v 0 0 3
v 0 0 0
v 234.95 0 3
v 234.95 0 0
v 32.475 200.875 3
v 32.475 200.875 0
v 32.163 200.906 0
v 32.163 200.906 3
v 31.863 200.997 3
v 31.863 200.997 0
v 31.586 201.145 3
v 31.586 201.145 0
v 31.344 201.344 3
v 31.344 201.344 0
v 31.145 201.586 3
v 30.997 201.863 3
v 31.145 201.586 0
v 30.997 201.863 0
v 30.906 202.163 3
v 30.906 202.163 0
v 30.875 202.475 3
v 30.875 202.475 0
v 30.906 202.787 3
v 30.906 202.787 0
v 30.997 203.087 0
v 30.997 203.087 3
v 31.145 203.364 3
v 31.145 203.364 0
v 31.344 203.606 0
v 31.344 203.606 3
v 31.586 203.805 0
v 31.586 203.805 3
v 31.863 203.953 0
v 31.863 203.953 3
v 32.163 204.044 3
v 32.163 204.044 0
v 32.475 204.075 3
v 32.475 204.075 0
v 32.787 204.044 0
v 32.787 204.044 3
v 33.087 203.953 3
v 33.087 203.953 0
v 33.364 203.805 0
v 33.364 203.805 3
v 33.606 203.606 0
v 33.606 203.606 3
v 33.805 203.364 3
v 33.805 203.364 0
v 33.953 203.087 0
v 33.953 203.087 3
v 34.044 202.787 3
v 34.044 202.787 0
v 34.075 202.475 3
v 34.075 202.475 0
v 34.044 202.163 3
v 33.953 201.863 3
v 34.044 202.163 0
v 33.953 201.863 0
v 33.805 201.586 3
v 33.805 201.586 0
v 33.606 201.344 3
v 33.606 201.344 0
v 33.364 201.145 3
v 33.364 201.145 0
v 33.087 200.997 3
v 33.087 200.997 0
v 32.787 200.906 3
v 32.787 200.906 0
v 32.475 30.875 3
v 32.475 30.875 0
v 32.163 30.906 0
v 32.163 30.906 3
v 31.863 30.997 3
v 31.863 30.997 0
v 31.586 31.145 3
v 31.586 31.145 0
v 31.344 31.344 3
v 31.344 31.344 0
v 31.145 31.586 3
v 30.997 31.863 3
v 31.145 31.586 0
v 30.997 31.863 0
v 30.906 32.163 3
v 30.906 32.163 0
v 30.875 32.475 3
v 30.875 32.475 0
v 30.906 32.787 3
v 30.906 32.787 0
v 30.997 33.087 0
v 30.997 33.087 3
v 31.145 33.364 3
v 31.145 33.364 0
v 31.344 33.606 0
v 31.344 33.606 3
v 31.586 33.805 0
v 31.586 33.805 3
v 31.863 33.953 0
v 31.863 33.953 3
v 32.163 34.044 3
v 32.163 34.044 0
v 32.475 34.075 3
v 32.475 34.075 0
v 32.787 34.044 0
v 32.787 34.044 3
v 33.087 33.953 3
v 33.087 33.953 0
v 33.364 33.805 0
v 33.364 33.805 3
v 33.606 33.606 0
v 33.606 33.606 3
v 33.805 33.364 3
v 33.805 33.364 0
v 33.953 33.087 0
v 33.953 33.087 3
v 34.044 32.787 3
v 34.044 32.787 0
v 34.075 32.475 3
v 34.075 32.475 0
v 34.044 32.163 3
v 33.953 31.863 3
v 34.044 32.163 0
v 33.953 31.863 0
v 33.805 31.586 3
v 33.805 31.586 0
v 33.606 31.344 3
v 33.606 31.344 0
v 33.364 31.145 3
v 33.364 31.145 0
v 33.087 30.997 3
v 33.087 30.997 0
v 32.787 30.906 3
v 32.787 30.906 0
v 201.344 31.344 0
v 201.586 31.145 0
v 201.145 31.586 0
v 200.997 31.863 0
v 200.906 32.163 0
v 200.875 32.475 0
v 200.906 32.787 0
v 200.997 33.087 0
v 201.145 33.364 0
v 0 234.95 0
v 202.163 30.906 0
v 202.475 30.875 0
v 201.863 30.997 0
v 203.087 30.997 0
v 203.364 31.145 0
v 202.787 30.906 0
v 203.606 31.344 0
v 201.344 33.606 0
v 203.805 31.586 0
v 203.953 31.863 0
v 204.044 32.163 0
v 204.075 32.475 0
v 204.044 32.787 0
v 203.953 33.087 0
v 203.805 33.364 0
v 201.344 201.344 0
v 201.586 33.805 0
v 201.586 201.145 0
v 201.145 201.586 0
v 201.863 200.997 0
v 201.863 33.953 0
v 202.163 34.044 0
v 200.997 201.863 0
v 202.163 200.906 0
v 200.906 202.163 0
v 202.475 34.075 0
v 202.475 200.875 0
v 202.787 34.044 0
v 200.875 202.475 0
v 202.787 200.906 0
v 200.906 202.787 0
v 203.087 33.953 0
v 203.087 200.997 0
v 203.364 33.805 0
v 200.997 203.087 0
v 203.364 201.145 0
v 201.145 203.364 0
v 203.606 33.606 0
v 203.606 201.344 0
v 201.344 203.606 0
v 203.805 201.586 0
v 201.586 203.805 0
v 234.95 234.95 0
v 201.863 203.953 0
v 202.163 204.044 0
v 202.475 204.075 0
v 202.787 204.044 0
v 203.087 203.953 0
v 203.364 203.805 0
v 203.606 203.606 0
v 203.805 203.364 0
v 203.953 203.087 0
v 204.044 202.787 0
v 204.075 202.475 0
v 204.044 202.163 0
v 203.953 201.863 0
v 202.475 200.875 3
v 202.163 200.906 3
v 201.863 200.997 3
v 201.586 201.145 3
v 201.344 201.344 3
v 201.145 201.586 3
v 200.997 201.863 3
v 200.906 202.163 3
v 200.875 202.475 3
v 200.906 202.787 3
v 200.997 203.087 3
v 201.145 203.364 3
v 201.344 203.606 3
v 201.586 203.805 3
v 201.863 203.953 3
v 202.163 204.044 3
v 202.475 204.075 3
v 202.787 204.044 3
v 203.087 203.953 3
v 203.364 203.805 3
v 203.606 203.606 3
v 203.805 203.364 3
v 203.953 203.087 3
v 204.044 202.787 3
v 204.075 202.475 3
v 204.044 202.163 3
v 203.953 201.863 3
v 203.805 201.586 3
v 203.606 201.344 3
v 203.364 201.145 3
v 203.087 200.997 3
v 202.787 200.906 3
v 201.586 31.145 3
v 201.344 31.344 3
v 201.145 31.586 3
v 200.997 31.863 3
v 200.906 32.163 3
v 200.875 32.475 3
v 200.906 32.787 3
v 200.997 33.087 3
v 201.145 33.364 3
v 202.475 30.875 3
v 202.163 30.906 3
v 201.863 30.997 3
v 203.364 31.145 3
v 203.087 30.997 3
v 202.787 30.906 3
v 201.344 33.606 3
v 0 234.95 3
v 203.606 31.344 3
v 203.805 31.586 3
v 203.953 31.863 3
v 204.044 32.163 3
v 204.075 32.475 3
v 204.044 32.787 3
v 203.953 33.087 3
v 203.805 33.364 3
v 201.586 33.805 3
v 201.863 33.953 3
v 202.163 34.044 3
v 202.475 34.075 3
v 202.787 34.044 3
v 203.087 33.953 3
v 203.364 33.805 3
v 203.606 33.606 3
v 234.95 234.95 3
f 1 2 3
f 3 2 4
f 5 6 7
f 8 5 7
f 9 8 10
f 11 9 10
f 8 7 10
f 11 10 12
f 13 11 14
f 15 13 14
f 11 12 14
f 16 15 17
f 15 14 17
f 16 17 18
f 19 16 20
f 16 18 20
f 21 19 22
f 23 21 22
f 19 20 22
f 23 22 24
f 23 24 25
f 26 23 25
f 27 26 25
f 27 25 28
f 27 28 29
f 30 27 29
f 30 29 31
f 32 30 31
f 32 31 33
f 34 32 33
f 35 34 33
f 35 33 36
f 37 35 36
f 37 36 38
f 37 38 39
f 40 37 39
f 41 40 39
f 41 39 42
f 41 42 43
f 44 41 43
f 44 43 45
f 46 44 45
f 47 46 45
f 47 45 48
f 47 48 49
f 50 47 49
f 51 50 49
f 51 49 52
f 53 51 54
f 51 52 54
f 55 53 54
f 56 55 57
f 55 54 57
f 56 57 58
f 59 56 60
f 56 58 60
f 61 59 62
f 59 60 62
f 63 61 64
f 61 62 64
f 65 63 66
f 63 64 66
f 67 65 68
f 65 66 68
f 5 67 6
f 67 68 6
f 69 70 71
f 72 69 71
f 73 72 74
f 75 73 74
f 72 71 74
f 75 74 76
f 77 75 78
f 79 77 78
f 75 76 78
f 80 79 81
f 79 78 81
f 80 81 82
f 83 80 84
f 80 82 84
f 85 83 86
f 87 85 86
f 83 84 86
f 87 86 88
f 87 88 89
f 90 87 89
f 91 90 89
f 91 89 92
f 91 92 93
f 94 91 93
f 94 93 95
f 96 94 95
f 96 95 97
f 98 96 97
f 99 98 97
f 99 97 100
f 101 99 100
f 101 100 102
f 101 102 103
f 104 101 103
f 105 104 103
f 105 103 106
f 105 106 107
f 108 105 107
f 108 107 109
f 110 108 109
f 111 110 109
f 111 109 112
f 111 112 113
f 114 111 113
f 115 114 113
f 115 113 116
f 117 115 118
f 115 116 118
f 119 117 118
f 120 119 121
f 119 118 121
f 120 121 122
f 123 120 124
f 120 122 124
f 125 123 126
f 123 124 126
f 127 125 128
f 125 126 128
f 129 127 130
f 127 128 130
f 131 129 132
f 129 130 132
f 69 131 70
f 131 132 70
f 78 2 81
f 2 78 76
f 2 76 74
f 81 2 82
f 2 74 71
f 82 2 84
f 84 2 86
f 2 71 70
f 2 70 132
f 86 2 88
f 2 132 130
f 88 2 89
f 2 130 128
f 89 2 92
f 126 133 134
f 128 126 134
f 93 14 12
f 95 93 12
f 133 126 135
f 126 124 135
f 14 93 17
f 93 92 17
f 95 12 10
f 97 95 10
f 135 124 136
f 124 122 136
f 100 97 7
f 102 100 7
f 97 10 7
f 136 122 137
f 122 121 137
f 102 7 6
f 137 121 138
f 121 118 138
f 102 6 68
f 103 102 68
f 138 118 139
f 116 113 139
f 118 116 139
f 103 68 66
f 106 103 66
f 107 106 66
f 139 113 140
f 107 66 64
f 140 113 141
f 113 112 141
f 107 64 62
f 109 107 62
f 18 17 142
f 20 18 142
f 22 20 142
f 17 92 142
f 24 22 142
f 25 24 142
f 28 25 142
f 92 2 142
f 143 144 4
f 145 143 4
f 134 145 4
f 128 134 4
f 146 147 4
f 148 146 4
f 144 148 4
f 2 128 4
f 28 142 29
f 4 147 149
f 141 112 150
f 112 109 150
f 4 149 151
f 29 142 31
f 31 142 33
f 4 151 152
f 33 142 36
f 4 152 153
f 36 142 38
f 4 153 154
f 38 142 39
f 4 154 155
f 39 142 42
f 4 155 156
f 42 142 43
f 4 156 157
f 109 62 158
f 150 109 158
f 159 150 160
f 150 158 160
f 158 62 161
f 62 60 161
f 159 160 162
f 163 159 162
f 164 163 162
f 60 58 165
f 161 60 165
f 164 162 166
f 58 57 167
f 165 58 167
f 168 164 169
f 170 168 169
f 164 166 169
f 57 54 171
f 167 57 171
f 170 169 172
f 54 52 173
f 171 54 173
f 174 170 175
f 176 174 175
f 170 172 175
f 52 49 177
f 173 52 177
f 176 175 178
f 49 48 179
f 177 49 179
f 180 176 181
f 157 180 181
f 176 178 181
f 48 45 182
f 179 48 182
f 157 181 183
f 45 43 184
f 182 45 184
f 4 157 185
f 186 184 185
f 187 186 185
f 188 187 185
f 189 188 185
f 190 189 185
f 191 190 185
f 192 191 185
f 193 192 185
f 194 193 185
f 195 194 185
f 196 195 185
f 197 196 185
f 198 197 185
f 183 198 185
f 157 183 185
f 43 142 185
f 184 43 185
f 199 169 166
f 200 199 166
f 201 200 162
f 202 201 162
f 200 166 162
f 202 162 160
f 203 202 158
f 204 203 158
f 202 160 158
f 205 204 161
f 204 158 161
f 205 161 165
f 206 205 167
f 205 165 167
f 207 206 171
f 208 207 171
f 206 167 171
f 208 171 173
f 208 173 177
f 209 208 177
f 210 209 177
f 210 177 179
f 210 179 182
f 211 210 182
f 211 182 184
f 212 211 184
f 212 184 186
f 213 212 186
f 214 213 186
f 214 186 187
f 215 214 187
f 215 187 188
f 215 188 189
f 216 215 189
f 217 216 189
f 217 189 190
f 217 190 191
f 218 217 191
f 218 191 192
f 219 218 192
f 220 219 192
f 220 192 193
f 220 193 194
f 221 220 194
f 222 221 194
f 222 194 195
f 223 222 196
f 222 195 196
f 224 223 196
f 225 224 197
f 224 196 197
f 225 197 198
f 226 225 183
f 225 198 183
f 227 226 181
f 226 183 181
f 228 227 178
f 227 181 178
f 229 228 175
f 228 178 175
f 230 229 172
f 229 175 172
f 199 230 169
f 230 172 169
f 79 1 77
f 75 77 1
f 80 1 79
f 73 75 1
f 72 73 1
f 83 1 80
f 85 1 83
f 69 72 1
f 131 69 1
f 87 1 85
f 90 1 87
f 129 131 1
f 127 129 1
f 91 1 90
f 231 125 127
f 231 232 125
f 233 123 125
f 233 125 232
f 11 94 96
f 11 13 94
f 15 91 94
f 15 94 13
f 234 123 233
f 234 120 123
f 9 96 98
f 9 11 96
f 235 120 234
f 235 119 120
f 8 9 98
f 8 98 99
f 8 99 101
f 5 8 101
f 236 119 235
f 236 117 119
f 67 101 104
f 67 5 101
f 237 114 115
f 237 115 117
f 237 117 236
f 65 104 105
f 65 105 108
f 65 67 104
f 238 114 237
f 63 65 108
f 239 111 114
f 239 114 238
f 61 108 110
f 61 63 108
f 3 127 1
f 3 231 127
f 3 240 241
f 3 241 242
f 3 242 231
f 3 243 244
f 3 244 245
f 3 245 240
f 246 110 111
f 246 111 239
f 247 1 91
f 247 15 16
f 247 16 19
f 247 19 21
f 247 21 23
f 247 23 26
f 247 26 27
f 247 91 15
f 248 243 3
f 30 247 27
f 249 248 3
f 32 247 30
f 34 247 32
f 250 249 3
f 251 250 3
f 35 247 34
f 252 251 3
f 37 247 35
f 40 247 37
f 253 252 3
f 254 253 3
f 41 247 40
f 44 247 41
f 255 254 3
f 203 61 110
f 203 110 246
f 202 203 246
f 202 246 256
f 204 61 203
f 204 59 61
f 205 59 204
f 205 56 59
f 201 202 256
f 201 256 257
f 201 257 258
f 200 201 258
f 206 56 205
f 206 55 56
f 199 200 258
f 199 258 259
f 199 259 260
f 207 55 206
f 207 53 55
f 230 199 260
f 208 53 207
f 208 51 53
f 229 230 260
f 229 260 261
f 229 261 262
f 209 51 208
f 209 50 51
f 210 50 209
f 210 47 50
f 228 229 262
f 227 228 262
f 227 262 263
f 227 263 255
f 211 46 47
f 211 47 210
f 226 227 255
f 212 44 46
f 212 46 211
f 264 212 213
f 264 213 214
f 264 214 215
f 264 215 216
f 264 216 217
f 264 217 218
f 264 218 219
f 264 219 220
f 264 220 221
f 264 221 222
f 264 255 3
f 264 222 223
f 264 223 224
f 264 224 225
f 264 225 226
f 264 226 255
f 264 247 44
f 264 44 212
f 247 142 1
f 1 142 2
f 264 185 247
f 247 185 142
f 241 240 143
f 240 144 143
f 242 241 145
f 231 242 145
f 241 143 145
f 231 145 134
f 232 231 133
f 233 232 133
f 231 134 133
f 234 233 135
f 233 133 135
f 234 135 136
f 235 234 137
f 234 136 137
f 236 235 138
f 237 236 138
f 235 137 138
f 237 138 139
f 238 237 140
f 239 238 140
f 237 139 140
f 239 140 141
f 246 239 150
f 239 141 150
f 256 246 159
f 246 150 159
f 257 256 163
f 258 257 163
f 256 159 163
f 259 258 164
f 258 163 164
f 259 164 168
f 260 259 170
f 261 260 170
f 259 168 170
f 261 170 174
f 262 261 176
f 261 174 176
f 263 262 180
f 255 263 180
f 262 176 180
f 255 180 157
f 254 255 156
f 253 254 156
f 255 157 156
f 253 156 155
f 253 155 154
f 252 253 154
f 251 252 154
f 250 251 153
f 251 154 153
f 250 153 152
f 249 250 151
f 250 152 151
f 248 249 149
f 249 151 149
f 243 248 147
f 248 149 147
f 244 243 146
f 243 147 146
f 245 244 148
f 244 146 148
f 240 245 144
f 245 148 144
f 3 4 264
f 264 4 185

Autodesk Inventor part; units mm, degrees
ref_plane "YZ Plane" through (0, 0, 0) normal (1, 0, 0) x (0, 1, 0)
ref_plane "XZ Plane" through (0, 0, 0) normal (0, 1, 0) x (-1, 0, 0)
ref_plane "XY Plane" through (0, 0, 0) normal (0, 0, 1) x (1, 0, 0)
sketch "Sketch1" plane through (0, 0, 0) normal (0, 0, 1) x (1, 0, 0)
  line L0 (0, 0) -> (234.95, 0)
  line L1 (234.95, 0) -> (234.95, 234.95)
  line L2 (234.95, 234.95) -> (0, 234.95)
  line L3 (0, 234.95) -> (0, 0)
  dimension "d0" = 234.95
  dimension "d1" = 234.95
extrude "Extrusion1" add sketch "Sketch1" along normal blind 3
ref_plane "Work Plane1" through (0, 117.475, 0) normal (0, 1, 0) x (1, 0, 0)
sketch "Sketch2" plane through (0, 0, 3) normal (0, 0, 1) x (1, 0, 0)
  line L0 (0, 234.95) -> (0, 0) projected
  line L1 (234.95, 0) -> (234.95, 234.95) projected
  line L2 (0, 0) -> (234.95, 0) projected
  line L3 (234.95, 234.95) -> (0, 234.95) projected
  line L4 (54.825, 126.475) -> (78.825, 126.475) construction
  line L5 (156.125, 126.475) -> (180.125, 126.475) construction
  line L6 (107.475, 127.475) -> (127.475, 127.475) construction
  line L7 (127.475, 127.475) -> (127.475, 107.475) construction
  line L8 (127.475, 107.475) -> (107.475, 107.475) construction
  line L9 (107.475, 107.475) -> (107.475, 127.475) construction
  line L10 (93.15, 137.475) -> (93.15, 97.475) construction
  point P0 (32.475, 202.475)
  point P1 (202.475, 202.475)
  point P2 (202.475, 32.475)
  point P3 (32.475, 32.475)
  point P4 (54.825, 108.475)
  point P5 (78.825, 108.475)
  point P6 (156.125, 108.475)
  point P7 (180.125, 108.475)
  point P8 (66.825, 126.475)
  point P9 (168.125, 126.475)
  point P10 (117.475, 127.475)
  point P11 (117.475, 234.95)
  point P12 (127.475, 117.475)
  point P13 (234.95, 117.475)
  point P14 (93.15, 117.475)
  point P15 (0, 117.475)
  dimension "d4" = 170
  dimension "d5" = 170
  dimension "d6" = 32.475
  dimension "d7" = 32.475
  dimension "d8" = 32.475
  dimension "d9" = 32.475
  dimension "d17" = 24
  dimension "d18" = 18
  dimension "d19" = 18
  dimension "d20" = 24
  dimension "d21" = 101.3
  dimension "d22" = 54.825
  dimension "d23" = 54.825
  dimension "d24" = 108.475
  dimension "d25" = 108.475
  dimension "d33" = 20
  dimension "d34" = 40
  dimension "d35" = 14.325
  dimension "d36" = 14.325
hole "Hole1" at (32.475, 202.475, 3) at (202.475, 202.475, 3) at (202.475, 32.475, 3) at (32.475, 32.475, 3) direction (0, 0, -1) diameter 3.2 end through all
equation "\"d5\" = d4"
equation "\"d6\" = d7"
equation "\"d8\" = d9"
equation "\"d19\" = d18"
equation "\"d20\" = d17"
equation "\"d22\" = d23"
equation "\"d24\" = d25"
equation "\"d35\" = d36"
properties part number "Print bed"
